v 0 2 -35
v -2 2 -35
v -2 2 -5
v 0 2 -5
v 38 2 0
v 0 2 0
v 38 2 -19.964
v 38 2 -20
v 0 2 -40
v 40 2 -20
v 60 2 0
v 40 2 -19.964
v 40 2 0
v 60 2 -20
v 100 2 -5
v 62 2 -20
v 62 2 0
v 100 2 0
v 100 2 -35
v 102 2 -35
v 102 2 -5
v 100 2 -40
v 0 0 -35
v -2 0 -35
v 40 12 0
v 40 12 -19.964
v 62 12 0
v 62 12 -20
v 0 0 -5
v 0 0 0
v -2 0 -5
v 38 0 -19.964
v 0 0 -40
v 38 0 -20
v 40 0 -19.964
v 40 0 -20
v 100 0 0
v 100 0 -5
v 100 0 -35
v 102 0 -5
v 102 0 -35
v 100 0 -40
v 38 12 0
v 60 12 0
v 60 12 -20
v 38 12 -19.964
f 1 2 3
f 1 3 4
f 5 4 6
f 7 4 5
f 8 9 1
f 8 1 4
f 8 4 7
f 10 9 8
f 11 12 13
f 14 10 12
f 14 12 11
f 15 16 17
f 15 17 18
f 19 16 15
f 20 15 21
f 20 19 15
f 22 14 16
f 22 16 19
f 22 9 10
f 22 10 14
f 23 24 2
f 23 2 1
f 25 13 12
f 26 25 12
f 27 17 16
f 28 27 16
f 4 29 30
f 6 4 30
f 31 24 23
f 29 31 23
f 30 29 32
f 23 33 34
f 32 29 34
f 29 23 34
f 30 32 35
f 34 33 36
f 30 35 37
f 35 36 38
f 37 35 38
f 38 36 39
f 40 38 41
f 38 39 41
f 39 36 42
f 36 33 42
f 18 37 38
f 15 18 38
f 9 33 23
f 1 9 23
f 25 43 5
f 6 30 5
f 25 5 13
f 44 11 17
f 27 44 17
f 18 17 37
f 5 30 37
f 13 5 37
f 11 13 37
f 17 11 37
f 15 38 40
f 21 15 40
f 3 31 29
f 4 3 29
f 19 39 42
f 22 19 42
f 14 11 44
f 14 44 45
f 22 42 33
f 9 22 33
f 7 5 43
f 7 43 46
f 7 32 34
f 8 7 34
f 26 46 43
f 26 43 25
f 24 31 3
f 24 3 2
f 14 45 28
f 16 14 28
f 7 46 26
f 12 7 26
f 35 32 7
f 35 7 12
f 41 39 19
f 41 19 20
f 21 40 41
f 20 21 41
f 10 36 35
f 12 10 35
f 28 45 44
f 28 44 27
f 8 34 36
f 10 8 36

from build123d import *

# Parameters (mm, degrees)
SKETCH_1_W      = 2
SKETCH_1_H      = 30
EXTRUDE_3_DEPTH = 2
SKETCH_3_W      = 2
SKETCH_3_H      = 19.963569182
SKETCH_3_H_2    = 20
EXTRUDE_4_DEPTH = 12


with BuildPart() as part:
    # 草图1 → 凸台-拉伸3 (new body)
    with BuildSketch(Plane(origin=(0, 0, 0), x_dir=(1, 0, 0), z_dir=(0, 1, 0))):
        Polygon((100, 40), (0, 40), (0, 35), (0, 5), (0, 0), (38, 0), (38, 20), (40, 20), (40, 0), (60, 0), (60, 20), (62, 20), (62, 0), (100, 0), (100, 5), (100, 35), align=None)
        with Locations((-1, 20)):
            Rectangle(SKETCH_1_W, SKETCH_1_H)
        with Locations((101, 20)):
            Rectangle(SKETCH_1_W, SKETCH_1_H)
    extrude(amount=EXTRUDE_3_DEPTH)

    # 草图3 → 凸台-拉伸4 (add)
    with BuildSketch(Plane(origin=(0, 0, 0), x_dir=(1, 0, 0), z_dir=(0, 1, 0))):
        with Locations((39, 9.981784591)):
            Rectangle(SKETCH_3_W, SKETCH_3_H)
        with Locations((61, 10)):
            Rectangle(SKETCH_3_W, SKETCH_3_H_2)
    extrude(amount=EXTRUDE_4_DEPTH)


solid = part.part
